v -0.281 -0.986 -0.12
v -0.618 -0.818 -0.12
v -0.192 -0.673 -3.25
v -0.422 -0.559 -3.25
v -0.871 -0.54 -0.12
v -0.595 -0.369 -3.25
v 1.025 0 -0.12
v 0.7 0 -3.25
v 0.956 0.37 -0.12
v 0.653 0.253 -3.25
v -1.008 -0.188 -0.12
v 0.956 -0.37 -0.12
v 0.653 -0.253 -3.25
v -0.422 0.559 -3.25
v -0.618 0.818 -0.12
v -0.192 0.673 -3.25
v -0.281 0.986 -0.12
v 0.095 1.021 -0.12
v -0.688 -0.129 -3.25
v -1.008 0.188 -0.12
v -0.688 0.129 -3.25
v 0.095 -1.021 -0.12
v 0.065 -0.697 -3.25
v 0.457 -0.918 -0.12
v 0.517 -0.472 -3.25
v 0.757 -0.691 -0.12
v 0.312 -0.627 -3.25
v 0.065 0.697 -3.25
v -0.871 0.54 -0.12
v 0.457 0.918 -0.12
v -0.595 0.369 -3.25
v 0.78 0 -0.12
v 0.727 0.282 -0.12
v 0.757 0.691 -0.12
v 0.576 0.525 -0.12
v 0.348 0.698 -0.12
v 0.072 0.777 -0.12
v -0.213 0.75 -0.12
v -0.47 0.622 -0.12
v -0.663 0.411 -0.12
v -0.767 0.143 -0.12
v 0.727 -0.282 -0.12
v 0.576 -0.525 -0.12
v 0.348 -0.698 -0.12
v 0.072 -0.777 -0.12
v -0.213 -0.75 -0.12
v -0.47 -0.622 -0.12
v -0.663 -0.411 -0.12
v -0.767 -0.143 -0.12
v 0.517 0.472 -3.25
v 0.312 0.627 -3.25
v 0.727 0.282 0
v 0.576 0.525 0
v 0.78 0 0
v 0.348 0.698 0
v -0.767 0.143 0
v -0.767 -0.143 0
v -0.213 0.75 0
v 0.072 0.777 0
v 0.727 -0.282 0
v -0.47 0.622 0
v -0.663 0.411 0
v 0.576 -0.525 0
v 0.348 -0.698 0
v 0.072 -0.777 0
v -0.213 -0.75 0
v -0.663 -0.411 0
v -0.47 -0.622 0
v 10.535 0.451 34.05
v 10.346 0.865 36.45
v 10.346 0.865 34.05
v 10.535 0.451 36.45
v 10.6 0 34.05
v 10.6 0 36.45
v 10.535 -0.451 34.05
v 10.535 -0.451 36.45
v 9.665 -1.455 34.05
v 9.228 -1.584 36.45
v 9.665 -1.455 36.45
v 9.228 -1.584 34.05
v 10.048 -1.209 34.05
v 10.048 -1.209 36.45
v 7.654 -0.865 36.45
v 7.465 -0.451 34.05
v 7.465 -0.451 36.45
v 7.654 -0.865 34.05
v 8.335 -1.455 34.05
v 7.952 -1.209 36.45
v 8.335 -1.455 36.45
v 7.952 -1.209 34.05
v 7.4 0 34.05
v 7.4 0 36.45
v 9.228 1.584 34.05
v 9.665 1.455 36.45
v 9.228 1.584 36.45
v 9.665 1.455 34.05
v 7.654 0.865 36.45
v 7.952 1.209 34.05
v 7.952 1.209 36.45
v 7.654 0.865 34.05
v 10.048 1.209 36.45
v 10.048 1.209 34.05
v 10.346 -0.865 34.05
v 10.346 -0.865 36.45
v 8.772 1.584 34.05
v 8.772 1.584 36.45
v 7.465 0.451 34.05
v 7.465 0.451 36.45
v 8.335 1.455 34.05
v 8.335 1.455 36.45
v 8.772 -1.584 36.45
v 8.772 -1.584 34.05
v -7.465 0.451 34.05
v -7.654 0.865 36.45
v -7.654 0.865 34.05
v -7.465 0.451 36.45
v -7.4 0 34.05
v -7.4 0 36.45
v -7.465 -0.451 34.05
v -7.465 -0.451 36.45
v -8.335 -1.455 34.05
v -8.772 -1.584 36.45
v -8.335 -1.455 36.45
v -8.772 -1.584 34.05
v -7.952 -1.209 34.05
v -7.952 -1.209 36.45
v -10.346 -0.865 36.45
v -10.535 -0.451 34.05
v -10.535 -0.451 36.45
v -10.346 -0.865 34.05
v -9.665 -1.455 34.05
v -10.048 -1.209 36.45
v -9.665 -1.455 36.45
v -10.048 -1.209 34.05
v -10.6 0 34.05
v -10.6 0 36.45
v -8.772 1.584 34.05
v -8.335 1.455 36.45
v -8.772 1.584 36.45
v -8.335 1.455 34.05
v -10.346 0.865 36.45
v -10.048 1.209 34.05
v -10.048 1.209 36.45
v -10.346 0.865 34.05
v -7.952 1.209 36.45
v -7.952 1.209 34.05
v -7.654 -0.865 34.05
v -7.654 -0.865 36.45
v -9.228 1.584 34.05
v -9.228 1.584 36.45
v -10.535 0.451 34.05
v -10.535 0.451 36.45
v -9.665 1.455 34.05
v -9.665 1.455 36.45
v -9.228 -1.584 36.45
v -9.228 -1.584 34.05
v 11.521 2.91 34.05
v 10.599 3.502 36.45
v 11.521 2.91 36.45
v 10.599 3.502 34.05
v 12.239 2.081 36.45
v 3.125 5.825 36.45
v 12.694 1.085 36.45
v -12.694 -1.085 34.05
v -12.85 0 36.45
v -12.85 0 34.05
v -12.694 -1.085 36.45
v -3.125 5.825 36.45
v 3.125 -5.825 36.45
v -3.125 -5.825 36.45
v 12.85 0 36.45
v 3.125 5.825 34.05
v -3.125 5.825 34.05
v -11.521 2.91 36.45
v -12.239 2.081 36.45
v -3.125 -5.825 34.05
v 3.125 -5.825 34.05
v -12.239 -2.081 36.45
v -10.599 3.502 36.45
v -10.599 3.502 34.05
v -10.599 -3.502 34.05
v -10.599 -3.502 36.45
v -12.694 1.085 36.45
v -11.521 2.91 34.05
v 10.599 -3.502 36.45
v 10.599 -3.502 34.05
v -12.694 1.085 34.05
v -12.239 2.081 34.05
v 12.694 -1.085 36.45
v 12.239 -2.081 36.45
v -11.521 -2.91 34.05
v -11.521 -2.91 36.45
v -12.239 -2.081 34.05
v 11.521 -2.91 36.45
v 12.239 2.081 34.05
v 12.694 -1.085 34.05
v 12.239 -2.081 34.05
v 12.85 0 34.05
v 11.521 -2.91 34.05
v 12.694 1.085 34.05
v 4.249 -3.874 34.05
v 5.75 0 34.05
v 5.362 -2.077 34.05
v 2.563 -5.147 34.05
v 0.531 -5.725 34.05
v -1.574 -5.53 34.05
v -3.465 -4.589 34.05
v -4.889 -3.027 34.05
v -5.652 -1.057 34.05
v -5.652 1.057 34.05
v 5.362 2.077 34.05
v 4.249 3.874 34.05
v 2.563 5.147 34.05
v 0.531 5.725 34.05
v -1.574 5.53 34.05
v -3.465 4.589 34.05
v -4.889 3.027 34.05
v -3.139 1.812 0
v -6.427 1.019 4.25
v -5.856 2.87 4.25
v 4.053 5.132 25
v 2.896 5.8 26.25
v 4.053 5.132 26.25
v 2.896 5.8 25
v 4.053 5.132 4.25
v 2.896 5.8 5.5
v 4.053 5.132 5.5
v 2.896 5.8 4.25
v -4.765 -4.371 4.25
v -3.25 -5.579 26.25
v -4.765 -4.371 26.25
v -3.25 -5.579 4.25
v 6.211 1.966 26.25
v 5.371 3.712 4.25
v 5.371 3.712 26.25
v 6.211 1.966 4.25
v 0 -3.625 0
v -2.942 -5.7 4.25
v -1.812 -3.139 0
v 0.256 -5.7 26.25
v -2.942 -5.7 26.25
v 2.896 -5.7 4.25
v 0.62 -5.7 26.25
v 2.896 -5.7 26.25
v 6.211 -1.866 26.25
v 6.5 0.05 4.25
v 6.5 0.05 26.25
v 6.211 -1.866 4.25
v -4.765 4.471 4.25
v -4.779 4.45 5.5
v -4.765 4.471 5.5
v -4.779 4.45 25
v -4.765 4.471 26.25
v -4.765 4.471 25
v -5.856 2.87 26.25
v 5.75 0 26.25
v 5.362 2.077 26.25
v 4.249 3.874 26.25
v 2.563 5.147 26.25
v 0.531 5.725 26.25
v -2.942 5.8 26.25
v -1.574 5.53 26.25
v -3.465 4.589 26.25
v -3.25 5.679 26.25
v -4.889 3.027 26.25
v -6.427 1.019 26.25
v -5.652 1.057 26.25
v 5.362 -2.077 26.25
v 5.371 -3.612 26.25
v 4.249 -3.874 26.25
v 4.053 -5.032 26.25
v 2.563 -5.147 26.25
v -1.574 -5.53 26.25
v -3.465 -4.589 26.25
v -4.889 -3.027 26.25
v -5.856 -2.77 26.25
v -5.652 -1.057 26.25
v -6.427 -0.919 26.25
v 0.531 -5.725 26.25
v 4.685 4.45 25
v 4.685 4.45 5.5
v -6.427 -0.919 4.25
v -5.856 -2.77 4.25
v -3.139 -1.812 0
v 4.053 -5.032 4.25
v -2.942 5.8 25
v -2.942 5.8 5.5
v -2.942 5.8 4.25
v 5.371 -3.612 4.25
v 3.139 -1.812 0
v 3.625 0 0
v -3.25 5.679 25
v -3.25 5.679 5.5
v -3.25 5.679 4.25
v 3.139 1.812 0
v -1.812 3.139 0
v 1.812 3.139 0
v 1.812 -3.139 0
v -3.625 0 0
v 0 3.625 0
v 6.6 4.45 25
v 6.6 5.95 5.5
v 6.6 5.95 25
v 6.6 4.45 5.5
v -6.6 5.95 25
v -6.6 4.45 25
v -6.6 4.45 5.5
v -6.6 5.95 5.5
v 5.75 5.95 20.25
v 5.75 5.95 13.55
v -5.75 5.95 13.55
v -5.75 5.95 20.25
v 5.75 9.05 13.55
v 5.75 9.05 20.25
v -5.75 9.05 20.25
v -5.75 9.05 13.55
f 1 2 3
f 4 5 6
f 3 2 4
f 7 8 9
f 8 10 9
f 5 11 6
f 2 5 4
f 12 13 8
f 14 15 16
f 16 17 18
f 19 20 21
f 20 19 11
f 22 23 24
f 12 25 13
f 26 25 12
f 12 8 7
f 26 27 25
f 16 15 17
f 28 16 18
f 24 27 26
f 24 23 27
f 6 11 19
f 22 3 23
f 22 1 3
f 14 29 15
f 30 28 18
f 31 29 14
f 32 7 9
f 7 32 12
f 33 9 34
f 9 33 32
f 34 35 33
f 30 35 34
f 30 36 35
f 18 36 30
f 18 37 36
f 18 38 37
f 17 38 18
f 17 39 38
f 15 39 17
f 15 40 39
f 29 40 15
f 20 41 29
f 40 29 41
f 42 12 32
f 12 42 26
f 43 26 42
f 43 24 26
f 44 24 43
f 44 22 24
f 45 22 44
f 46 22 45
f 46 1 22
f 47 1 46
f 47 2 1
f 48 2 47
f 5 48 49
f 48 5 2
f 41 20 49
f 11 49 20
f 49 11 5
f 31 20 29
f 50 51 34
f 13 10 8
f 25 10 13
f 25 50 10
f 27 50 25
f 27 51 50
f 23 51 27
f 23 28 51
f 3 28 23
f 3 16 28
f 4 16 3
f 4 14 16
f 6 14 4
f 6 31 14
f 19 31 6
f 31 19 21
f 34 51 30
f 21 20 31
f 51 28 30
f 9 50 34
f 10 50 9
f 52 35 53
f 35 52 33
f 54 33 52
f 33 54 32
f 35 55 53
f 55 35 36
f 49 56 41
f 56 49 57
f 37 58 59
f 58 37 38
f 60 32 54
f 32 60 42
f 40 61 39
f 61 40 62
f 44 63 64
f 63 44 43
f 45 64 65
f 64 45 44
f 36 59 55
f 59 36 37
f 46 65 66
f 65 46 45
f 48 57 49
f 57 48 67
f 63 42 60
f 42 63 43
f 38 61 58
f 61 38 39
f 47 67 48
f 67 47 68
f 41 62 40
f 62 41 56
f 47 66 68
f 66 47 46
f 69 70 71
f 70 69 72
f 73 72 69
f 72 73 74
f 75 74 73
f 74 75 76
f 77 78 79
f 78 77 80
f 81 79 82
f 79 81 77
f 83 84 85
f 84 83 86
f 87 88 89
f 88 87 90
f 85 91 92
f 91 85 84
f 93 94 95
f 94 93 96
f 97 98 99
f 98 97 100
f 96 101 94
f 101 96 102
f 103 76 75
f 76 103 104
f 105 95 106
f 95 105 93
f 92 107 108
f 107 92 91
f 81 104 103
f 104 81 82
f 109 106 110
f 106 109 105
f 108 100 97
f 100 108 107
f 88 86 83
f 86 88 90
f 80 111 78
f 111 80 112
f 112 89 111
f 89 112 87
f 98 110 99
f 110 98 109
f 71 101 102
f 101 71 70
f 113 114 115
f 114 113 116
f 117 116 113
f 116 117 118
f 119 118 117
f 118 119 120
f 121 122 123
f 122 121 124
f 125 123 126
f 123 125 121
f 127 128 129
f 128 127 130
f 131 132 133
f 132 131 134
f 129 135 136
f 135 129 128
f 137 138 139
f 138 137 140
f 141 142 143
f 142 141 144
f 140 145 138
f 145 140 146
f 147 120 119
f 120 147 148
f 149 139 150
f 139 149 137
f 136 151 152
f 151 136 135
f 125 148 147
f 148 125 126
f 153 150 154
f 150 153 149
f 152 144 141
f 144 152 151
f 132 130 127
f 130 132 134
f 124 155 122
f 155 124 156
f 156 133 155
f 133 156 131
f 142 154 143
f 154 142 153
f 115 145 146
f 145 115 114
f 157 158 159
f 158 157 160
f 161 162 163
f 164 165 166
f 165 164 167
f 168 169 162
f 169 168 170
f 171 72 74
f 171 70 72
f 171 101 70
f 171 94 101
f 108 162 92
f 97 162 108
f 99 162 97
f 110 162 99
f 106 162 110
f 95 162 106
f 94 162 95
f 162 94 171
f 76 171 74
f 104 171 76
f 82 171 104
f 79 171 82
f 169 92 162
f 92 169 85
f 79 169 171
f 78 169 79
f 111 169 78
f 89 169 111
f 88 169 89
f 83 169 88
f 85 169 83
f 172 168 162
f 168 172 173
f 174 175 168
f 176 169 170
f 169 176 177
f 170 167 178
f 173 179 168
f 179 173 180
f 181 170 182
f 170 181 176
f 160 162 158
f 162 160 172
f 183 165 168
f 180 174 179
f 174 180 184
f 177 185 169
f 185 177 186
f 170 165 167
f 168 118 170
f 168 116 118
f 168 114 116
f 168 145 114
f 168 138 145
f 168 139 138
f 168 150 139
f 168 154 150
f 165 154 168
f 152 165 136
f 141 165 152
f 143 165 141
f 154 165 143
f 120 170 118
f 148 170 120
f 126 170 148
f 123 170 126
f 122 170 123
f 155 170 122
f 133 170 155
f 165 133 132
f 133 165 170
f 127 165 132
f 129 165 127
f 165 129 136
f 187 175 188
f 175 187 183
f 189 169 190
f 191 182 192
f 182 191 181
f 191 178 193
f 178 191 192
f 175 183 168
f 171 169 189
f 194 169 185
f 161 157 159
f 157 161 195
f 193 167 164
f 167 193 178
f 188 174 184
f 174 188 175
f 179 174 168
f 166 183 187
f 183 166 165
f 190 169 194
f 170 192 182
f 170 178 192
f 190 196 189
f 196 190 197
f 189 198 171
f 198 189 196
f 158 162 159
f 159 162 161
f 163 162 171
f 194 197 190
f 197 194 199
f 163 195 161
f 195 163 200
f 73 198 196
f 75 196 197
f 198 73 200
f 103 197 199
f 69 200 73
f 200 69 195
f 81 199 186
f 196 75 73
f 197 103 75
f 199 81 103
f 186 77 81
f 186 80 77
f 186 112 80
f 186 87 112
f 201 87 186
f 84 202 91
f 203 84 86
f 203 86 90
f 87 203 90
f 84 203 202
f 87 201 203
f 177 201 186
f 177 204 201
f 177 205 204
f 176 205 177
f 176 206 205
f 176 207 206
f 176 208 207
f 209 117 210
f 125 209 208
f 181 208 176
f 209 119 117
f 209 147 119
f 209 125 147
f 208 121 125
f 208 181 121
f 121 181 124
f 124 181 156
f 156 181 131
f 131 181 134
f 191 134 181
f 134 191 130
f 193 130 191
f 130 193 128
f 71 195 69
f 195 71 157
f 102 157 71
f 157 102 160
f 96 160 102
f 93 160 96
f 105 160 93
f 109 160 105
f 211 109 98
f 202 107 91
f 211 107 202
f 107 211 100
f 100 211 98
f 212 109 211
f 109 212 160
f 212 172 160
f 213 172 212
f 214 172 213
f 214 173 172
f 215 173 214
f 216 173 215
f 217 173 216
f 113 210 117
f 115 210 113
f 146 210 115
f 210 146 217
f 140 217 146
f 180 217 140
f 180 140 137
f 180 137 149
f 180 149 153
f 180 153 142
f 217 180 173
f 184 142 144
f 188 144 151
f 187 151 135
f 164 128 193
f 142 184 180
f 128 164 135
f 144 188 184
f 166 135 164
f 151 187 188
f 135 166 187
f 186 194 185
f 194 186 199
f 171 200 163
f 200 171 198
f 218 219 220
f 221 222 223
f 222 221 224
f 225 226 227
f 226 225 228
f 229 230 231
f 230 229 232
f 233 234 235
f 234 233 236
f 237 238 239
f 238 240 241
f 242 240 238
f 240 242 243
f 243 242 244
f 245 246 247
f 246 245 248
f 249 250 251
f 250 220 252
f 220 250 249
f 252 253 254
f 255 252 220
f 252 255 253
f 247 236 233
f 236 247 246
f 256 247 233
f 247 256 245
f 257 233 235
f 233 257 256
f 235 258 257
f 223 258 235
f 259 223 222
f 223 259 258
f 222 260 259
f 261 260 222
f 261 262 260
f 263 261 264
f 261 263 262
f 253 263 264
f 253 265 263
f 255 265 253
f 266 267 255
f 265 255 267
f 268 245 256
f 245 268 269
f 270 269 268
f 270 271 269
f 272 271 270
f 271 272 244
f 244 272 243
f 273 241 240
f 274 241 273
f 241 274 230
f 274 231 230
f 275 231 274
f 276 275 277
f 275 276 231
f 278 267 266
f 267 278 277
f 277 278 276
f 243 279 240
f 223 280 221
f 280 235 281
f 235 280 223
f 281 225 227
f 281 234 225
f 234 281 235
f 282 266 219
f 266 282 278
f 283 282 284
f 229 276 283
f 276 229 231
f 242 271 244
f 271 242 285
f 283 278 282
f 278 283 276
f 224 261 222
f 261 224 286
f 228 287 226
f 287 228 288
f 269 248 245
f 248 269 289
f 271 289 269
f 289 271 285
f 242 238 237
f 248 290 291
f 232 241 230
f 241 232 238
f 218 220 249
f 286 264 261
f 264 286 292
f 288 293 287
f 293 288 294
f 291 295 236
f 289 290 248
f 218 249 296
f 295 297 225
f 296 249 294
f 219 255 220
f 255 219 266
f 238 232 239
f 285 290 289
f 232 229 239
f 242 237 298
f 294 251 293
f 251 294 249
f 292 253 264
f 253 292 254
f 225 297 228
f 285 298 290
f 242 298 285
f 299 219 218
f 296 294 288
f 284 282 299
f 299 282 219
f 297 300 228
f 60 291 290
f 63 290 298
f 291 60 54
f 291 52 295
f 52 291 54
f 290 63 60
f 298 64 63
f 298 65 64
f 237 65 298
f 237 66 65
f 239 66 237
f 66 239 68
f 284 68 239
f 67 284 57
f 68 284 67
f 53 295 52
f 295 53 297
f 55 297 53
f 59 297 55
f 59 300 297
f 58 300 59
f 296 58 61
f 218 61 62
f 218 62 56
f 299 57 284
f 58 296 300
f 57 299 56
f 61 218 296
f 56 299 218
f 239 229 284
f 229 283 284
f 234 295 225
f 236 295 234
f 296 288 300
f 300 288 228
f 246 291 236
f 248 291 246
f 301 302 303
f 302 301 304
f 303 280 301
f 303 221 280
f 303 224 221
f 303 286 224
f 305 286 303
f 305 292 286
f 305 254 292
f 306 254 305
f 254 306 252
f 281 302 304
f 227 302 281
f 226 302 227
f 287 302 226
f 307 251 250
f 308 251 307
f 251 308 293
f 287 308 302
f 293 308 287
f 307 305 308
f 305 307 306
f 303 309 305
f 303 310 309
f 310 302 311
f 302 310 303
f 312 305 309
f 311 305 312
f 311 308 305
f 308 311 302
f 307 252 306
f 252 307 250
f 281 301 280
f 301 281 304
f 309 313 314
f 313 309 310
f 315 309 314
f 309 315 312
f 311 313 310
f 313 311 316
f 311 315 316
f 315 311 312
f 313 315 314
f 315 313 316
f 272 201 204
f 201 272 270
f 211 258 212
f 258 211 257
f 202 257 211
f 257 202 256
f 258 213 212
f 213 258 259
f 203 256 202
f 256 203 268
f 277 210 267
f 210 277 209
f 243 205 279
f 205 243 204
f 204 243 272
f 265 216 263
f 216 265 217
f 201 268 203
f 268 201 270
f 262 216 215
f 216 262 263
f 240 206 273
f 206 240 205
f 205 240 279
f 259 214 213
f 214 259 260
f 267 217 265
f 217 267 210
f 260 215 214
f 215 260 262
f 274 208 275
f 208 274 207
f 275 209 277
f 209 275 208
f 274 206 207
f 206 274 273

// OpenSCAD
// bltouch.scad
// This is for a BLTouch SMART V3.1 from Antclabs
// in the retracted position (up=1) the tip should be 2.3 to 4.3 mm
// above the tip of the nozzle of the extruder

//------------------------------------------
module bltip(){

// probe tip
cylinder(r1=1.4/2,r2=2.05/2,h=3.13,$fn=17);
translate([0,0,3.12])
cylinder(r=1.56/2,h=3.71,$fn=17);
translate([0,0,3.13+3.7])
cylinder(r=2.05/2,h=3.5,$fn=17);

}
//------------------------------------------
module blbody(tol=0){

// main body
hull(){
  cylinder(r=7.25/2,h=0.01);
  translate([0,0.05,26.25-22.0+11.0])
  intersection(){
    cube([13.10,11.5,22.0],center=true);
    cylinder(r=6.5,h=22,center=true);
  }
}
// pcb
color("green")
translate([0,5.2,5.5+19.5/2])
cube([13.2,1.5,19.5],center=true);

// connector
color("gray")
translate([0,5.25+3.8/2,16.9])
cube([11.5,3.8,6.7],center=true);

// upper cylinder
translate([0,0,26.25])
cylinder(r=11.5/2,h=8.4,$fn=17);

// top flange
difference(){
  hull(){
    translate([0,0,36.45-2.4/2])
    cube([6.25,11.65,2.4],center=true);
    translate([0,0,36.45-2.4]){
      translate([9.0,0,0])
      cylinder(r=3.85,h=2.4,$fn=22);
      translate([-9.0,0,0])
      cylinder(r=3.85,h=2.4,$fn=22);
    }
  }

  translate([0,0,36.45-2.5]){
    translate([9.0,0,0])
    cylinder(r=3.2/2,h=2.6,$fn=22);
    translate([-9.0,0,0])
    cylinder(r=3.2/2,h=2.6,$fn=22);
  }
}

}
//-------------------------------------------
module bltouch(
tol=0,
up=0
){

if(up==1){  
  translate([0,0,-3.25])   // up position
  bltip();
}
if(up==0){
  translate([0,0,-9.7])   // down position
  bltip();
}
blbody();
}

//============================================

bltouch(up=1,tol=0);

//=============================================
